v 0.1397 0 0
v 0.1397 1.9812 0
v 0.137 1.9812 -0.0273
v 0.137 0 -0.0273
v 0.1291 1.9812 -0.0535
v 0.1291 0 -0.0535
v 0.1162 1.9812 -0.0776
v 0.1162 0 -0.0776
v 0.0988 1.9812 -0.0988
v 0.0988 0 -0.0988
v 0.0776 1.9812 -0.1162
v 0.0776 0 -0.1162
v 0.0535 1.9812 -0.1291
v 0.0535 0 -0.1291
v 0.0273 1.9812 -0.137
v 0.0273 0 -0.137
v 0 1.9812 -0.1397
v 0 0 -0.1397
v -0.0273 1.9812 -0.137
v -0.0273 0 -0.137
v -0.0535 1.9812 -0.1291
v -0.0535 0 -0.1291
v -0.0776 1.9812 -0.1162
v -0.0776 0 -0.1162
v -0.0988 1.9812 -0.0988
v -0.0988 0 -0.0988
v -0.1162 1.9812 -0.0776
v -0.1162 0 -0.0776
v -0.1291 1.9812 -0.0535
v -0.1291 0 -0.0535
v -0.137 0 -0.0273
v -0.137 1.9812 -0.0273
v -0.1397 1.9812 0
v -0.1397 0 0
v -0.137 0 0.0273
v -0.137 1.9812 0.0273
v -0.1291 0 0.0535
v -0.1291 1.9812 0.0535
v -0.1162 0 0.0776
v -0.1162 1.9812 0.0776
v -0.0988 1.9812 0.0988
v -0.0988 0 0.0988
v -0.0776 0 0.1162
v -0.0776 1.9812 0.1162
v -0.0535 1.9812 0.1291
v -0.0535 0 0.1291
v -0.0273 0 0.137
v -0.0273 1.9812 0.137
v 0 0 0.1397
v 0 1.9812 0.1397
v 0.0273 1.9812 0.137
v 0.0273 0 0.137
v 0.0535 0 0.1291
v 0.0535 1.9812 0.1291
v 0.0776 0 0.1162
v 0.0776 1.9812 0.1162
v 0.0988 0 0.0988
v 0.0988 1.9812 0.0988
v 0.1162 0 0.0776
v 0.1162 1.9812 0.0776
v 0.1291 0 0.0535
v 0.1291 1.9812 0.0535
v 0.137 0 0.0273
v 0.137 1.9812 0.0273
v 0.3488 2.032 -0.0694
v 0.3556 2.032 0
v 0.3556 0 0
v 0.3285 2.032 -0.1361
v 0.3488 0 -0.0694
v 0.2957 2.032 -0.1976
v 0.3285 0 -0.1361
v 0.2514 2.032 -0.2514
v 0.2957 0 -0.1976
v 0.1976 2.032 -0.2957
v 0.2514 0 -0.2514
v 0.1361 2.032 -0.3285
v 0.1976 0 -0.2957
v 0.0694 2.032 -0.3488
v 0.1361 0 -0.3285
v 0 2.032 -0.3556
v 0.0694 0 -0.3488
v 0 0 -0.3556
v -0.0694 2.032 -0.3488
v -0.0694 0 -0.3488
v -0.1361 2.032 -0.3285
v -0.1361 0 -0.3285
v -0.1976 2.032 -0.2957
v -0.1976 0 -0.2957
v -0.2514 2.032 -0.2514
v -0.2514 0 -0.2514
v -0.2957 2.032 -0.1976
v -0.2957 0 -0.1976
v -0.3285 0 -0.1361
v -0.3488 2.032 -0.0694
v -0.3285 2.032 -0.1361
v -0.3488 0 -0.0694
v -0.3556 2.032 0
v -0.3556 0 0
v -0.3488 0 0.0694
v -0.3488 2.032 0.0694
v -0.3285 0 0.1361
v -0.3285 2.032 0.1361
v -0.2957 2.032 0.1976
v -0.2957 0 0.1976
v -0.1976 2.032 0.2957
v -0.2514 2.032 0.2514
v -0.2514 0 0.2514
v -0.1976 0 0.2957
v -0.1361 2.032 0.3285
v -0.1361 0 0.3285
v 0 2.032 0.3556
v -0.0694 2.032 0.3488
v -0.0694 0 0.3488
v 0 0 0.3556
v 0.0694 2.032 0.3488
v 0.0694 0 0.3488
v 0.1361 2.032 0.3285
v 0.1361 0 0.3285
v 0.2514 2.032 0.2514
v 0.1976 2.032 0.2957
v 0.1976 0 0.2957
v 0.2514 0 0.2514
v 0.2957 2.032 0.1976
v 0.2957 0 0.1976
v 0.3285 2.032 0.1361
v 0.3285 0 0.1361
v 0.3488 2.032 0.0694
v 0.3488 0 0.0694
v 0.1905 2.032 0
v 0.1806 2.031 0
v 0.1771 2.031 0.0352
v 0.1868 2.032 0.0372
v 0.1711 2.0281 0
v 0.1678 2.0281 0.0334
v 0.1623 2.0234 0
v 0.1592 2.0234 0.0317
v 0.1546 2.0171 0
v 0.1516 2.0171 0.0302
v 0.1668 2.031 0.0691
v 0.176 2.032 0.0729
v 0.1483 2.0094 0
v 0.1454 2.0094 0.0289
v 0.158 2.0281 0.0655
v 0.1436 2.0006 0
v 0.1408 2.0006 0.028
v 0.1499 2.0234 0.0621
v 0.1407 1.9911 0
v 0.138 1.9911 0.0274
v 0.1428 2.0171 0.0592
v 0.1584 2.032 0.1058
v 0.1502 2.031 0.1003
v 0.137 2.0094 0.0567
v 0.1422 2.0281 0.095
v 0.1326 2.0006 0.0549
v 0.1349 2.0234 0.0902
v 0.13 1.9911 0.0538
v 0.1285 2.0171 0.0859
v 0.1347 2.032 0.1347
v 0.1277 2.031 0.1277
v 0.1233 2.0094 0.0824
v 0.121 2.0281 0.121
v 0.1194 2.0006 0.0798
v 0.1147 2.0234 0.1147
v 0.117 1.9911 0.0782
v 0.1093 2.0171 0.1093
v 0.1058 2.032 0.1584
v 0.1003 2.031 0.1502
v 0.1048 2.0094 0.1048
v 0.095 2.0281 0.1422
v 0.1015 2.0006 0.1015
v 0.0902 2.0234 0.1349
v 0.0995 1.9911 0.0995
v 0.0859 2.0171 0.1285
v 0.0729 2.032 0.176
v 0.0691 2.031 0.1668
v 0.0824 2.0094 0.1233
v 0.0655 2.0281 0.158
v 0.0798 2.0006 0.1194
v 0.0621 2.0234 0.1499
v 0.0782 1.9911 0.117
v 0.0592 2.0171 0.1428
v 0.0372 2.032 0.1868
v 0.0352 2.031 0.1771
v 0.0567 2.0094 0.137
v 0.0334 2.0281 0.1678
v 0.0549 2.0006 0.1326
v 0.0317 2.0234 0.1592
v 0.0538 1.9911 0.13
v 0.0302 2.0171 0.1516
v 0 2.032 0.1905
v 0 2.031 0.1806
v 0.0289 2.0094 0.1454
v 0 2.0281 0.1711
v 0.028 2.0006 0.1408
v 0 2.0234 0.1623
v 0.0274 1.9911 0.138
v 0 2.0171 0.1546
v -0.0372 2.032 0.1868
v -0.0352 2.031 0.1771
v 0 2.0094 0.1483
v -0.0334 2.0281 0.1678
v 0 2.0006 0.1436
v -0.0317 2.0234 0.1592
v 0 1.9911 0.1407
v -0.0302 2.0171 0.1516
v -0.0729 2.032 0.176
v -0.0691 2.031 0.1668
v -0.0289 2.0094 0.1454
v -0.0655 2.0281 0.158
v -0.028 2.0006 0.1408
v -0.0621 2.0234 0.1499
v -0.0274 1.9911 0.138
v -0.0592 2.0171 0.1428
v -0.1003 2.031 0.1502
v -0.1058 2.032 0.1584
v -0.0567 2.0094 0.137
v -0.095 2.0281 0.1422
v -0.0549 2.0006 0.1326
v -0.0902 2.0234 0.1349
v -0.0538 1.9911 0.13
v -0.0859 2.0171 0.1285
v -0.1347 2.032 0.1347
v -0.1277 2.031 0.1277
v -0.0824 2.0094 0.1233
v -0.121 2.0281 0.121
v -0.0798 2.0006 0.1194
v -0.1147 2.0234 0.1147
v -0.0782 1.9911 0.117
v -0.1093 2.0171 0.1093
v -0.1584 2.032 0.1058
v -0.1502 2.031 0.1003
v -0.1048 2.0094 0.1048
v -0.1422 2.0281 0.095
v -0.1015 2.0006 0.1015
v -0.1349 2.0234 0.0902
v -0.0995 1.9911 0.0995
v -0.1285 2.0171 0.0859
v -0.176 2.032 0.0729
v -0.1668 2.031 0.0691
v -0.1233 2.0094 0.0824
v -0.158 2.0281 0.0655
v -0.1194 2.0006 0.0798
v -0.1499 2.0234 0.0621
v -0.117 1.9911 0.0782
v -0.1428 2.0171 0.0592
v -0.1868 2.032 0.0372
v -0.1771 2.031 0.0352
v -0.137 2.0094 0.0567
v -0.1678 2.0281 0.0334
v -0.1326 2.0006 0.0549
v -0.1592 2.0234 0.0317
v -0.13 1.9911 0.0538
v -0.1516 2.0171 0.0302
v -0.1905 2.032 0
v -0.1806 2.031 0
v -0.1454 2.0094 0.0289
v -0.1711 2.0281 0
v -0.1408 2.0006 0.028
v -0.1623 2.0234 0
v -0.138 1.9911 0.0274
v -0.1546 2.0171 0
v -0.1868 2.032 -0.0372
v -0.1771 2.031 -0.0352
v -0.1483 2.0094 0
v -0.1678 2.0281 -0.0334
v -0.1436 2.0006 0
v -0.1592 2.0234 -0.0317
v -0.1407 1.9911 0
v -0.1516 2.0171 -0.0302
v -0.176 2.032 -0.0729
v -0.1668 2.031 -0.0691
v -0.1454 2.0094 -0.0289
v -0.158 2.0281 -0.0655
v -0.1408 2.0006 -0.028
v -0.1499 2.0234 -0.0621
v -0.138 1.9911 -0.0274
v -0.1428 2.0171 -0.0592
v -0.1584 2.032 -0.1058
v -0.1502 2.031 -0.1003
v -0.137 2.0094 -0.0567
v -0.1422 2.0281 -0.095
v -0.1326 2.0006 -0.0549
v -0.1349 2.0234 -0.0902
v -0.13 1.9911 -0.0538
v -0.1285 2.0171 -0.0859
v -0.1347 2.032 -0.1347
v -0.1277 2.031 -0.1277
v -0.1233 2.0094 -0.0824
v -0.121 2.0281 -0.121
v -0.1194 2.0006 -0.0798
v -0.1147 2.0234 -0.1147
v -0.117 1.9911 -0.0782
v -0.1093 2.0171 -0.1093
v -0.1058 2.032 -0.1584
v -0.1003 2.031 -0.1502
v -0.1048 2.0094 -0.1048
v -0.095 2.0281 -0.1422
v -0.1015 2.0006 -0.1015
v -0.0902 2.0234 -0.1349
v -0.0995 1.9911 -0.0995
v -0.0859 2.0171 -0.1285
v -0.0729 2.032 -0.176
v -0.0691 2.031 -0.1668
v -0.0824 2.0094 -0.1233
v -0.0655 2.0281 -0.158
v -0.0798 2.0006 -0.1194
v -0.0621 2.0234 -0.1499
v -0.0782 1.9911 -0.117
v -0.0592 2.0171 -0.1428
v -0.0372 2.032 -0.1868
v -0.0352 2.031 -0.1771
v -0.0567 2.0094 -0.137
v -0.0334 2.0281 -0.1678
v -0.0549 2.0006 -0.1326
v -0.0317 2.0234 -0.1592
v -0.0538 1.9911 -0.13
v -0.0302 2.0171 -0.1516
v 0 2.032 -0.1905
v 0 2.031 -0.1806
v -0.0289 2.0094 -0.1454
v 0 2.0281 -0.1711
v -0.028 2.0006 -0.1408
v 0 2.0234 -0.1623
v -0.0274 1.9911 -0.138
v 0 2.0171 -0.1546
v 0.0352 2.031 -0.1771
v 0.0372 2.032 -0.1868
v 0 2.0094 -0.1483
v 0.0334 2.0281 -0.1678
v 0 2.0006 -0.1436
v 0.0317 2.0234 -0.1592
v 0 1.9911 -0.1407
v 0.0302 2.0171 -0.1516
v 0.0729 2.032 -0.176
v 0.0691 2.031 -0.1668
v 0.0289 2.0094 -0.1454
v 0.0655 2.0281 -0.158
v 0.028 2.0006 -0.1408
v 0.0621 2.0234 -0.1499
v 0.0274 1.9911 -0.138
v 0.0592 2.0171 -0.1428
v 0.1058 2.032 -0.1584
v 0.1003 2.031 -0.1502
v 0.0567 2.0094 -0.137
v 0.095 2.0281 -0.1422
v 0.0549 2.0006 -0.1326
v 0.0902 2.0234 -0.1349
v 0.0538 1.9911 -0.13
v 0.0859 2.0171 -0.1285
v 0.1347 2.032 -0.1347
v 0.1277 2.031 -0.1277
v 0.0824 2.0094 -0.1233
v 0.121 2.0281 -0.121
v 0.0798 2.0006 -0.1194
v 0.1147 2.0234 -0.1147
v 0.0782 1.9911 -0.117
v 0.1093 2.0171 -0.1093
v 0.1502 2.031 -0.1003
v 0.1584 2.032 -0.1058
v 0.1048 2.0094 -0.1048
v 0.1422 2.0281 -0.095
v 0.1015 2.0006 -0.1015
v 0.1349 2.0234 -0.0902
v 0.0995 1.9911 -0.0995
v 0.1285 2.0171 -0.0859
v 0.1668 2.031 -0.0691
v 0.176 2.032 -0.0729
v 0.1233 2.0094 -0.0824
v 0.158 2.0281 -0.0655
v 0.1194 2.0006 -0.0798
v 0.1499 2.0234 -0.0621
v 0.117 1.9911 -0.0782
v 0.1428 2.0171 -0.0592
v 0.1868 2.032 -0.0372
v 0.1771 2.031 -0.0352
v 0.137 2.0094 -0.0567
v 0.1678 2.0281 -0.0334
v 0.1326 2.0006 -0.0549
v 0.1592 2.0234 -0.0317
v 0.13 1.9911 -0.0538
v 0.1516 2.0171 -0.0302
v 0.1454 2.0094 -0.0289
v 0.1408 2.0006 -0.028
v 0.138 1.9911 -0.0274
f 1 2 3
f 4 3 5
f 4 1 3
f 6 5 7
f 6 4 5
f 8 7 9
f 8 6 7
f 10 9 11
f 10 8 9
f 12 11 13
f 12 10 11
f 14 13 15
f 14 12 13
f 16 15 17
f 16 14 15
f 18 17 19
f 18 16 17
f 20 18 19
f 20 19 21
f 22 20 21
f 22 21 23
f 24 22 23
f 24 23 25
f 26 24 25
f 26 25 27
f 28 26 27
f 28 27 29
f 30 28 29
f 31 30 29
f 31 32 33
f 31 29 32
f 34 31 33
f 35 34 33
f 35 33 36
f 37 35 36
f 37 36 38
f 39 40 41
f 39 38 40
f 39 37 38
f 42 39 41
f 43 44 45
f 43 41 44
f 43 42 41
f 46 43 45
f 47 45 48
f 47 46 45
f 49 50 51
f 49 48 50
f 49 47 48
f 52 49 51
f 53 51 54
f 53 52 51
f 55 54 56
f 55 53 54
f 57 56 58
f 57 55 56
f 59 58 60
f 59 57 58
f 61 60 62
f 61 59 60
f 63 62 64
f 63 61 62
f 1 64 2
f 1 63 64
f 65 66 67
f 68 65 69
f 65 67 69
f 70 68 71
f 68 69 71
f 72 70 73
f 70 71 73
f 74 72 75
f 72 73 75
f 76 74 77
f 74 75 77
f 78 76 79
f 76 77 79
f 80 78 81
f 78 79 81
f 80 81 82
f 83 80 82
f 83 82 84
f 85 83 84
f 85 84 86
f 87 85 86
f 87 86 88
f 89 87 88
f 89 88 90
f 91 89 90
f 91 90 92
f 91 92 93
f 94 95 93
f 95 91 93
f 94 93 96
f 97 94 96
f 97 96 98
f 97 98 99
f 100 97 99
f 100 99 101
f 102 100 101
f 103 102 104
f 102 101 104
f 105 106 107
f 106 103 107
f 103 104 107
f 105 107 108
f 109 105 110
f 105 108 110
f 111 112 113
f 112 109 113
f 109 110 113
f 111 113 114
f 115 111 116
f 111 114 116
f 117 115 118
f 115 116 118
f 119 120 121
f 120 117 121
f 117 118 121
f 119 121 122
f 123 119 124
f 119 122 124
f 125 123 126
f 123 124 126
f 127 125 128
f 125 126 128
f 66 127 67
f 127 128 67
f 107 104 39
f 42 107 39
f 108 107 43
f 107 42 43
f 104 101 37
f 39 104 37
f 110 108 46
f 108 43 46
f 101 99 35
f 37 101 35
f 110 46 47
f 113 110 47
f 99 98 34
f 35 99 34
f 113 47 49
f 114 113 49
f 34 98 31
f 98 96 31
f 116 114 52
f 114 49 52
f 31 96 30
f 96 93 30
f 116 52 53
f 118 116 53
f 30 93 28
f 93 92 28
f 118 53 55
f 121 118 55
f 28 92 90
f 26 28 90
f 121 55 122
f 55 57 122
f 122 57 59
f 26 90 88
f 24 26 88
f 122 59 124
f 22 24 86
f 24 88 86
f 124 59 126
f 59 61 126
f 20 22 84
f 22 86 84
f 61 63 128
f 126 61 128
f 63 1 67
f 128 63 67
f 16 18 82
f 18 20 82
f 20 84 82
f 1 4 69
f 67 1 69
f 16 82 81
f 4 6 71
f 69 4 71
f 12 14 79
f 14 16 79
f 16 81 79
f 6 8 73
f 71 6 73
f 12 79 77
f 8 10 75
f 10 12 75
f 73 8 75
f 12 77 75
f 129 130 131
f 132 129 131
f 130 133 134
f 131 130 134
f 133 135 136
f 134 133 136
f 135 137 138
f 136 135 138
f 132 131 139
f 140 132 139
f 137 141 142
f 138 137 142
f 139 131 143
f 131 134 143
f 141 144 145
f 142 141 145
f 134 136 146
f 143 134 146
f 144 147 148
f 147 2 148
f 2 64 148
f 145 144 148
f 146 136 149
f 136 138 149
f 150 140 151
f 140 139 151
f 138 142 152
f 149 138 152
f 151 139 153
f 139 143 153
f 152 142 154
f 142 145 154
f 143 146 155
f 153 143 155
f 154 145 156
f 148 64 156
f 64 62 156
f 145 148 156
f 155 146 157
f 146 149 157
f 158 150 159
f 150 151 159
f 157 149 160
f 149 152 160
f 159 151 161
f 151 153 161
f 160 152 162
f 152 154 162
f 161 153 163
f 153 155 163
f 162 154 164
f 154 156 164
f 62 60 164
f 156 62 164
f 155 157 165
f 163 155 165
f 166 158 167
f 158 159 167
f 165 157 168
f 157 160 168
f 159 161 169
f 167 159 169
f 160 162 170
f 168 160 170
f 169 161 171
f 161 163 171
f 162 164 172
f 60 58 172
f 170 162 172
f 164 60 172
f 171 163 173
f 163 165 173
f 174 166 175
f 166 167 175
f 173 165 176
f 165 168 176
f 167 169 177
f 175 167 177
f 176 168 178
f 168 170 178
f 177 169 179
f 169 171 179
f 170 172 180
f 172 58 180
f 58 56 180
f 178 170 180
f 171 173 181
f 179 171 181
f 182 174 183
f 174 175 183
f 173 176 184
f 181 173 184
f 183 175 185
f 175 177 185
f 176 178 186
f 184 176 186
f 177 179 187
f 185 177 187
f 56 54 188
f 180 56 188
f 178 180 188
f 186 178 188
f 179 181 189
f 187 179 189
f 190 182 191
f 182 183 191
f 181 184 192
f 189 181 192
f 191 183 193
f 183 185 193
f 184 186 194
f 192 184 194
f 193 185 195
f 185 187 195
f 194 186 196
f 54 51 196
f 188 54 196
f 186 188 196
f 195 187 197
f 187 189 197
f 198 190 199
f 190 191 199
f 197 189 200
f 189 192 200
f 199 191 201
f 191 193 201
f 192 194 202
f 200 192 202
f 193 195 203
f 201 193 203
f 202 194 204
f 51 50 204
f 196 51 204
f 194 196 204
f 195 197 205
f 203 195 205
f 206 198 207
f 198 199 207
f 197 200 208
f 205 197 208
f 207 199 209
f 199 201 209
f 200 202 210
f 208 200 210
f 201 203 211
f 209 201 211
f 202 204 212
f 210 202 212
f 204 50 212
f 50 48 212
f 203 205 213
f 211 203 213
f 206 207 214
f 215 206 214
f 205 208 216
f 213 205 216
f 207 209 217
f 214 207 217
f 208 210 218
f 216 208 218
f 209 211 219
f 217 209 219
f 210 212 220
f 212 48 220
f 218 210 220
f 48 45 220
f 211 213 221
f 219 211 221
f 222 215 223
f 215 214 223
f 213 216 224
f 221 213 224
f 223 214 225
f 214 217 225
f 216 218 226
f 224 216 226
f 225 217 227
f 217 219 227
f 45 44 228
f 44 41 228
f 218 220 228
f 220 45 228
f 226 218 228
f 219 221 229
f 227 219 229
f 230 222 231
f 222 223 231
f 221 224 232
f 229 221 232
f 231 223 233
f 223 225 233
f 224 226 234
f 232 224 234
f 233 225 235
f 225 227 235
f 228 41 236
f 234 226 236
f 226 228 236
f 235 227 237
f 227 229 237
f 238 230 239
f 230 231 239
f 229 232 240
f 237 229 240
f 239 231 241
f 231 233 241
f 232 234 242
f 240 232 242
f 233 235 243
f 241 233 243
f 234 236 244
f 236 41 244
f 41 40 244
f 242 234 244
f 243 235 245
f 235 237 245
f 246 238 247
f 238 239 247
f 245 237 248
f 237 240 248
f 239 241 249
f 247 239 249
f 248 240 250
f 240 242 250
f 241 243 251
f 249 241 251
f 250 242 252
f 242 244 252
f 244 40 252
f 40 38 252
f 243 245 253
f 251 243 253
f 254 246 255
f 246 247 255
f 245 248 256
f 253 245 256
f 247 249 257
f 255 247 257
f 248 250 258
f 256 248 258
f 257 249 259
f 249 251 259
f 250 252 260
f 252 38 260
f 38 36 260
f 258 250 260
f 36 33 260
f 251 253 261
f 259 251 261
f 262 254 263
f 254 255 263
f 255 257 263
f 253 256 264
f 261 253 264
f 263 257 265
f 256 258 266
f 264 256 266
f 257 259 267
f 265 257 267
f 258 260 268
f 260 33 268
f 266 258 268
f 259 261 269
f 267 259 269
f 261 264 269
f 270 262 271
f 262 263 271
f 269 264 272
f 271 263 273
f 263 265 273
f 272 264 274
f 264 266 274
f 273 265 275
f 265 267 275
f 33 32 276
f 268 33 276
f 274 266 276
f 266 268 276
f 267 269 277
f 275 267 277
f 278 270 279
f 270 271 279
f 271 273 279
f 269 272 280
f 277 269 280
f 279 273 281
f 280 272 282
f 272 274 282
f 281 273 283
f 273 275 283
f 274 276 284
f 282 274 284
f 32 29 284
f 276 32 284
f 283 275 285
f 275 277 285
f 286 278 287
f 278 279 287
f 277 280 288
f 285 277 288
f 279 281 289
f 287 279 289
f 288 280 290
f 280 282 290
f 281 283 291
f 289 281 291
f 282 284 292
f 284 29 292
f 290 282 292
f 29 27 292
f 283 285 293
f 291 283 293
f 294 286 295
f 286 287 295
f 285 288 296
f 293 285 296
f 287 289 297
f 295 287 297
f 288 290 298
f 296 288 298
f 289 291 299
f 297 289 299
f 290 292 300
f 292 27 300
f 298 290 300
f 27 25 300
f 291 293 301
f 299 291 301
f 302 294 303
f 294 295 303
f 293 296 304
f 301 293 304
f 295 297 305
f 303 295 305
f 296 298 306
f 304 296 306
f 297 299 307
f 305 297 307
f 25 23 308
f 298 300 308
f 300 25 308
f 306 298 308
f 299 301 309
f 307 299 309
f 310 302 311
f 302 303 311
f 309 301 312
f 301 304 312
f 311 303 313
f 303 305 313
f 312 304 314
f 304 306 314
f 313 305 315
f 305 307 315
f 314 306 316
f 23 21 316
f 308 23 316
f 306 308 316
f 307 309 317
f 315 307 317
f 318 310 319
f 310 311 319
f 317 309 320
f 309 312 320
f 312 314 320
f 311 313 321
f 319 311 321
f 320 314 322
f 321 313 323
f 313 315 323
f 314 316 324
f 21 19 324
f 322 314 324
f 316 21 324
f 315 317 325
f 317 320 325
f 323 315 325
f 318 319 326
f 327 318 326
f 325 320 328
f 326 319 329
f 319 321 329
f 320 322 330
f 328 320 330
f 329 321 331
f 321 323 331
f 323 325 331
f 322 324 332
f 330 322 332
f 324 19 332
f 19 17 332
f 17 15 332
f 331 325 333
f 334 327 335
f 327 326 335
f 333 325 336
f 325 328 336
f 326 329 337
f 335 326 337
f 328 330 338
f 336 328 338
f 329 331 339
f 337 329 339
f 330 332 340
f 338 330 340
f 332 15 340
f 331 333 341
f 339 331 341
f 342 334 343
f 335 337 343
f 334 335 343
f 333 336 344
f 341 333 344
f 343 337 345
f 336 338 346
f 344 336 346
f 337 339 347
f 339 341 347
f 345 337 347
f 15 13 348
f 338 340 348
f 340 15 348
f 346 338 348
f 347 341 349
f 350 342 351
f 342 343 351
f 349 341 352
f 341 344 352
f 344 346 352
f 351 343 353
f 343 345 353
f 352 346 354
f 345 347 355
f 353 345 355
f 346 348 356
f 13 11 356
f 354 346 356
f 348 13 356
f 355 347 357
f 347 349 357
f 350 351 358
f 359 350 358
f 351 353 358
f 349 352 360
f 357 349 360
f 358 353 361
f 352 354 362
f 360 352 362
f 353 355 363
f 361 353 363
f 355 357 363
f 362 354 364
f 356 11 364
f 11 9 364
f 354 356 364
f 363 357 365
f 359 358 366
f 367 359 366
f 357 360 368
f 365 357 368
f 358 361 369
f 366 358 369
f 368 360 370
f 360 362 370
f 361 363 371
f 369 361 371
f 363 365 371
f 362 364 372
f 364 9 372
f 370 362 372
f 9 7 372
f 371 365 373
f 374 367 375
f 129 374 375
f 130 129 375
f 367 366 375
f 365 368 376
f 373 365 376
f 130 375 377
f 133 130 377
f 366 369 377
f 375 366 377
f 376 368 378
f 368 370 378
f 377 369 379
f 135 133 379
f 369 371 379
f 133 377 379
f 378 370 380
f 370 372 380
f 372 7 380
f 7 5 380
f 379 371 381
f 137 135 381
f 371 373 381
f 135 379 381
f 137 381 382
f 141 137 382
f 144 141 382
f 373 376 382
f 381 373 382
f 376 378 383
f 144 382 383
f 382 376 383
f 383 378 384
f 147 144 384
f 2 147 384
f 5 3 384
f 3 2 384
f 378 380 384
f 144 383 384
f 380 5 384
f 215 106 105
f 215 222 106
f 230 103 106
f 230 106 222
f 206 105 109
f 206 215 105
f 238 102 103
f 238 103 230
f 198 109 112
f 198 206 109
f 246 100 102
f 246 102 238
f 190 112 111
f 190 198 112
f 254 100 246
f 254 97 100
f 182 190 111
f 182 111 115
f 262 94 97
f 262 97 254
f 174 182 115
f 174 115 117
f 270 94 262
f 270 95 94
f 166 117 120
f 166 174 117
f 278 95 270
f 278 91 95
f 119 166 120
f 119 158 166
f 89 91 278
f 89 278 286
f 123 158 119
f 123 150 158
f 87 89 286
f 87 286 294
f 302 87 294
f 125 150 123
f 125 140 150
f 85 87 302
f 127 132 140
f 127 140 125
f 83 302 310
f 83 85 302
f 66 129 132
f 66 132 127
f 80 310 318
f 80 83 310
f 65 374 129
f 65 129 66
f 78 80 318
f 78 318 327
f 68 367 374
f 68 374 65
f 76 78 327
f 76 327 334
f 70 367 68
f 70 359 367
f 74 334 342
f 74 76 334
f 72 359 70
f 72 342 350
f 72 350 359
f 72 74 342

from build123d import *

# Parameters (mm, degrees)
SKETCH1_R           = 0.3556
SKETCH1_R_2         = 0.1397
BOSS_EXTRUDE1_DEPTH = 2.159
SKETCH2_R           = 0.4064
CUT_EXTRUDE1_DEPTH  = 0.127
FILLET1_R           = 0.0508


with BuildPart() as part:
    # Sketch1 → Boss-Extrude1 (new body)
    with BuildSketch(Plane(origin=(0, 0, 0), x_dir=(1, 0, 0), z_dir=(0, 1, 0))):
        Circle(SKETCH1_R)
        Circle(SKETCH1_R_2, mode=Mode.SUBTRACT)
    extrude(amount=BOSS_EXTRUDE1_DEPTH)

    # Sketch2 → Cut-Extrude1 (cut)
    with BuildSketch(Plane(origin=(0, 2.159, 0), x_dir=(1, 0, 0), z_dir=(0, 1, 0))):
        Circle(SKETCH2_R)
    extrude(amount=-CUT_EXTRUDE1_DEPTH, mode=Mode.SUBTRACT)

    # Fillet1
    fillet1_edges = [part.edges().sort_by_distance(p)[0] for p in [
        (-0.1397, 2.032, 0),
    ]]
    fillet(fillet1_edges, radius=FILLET1_R)


solid = part.part
